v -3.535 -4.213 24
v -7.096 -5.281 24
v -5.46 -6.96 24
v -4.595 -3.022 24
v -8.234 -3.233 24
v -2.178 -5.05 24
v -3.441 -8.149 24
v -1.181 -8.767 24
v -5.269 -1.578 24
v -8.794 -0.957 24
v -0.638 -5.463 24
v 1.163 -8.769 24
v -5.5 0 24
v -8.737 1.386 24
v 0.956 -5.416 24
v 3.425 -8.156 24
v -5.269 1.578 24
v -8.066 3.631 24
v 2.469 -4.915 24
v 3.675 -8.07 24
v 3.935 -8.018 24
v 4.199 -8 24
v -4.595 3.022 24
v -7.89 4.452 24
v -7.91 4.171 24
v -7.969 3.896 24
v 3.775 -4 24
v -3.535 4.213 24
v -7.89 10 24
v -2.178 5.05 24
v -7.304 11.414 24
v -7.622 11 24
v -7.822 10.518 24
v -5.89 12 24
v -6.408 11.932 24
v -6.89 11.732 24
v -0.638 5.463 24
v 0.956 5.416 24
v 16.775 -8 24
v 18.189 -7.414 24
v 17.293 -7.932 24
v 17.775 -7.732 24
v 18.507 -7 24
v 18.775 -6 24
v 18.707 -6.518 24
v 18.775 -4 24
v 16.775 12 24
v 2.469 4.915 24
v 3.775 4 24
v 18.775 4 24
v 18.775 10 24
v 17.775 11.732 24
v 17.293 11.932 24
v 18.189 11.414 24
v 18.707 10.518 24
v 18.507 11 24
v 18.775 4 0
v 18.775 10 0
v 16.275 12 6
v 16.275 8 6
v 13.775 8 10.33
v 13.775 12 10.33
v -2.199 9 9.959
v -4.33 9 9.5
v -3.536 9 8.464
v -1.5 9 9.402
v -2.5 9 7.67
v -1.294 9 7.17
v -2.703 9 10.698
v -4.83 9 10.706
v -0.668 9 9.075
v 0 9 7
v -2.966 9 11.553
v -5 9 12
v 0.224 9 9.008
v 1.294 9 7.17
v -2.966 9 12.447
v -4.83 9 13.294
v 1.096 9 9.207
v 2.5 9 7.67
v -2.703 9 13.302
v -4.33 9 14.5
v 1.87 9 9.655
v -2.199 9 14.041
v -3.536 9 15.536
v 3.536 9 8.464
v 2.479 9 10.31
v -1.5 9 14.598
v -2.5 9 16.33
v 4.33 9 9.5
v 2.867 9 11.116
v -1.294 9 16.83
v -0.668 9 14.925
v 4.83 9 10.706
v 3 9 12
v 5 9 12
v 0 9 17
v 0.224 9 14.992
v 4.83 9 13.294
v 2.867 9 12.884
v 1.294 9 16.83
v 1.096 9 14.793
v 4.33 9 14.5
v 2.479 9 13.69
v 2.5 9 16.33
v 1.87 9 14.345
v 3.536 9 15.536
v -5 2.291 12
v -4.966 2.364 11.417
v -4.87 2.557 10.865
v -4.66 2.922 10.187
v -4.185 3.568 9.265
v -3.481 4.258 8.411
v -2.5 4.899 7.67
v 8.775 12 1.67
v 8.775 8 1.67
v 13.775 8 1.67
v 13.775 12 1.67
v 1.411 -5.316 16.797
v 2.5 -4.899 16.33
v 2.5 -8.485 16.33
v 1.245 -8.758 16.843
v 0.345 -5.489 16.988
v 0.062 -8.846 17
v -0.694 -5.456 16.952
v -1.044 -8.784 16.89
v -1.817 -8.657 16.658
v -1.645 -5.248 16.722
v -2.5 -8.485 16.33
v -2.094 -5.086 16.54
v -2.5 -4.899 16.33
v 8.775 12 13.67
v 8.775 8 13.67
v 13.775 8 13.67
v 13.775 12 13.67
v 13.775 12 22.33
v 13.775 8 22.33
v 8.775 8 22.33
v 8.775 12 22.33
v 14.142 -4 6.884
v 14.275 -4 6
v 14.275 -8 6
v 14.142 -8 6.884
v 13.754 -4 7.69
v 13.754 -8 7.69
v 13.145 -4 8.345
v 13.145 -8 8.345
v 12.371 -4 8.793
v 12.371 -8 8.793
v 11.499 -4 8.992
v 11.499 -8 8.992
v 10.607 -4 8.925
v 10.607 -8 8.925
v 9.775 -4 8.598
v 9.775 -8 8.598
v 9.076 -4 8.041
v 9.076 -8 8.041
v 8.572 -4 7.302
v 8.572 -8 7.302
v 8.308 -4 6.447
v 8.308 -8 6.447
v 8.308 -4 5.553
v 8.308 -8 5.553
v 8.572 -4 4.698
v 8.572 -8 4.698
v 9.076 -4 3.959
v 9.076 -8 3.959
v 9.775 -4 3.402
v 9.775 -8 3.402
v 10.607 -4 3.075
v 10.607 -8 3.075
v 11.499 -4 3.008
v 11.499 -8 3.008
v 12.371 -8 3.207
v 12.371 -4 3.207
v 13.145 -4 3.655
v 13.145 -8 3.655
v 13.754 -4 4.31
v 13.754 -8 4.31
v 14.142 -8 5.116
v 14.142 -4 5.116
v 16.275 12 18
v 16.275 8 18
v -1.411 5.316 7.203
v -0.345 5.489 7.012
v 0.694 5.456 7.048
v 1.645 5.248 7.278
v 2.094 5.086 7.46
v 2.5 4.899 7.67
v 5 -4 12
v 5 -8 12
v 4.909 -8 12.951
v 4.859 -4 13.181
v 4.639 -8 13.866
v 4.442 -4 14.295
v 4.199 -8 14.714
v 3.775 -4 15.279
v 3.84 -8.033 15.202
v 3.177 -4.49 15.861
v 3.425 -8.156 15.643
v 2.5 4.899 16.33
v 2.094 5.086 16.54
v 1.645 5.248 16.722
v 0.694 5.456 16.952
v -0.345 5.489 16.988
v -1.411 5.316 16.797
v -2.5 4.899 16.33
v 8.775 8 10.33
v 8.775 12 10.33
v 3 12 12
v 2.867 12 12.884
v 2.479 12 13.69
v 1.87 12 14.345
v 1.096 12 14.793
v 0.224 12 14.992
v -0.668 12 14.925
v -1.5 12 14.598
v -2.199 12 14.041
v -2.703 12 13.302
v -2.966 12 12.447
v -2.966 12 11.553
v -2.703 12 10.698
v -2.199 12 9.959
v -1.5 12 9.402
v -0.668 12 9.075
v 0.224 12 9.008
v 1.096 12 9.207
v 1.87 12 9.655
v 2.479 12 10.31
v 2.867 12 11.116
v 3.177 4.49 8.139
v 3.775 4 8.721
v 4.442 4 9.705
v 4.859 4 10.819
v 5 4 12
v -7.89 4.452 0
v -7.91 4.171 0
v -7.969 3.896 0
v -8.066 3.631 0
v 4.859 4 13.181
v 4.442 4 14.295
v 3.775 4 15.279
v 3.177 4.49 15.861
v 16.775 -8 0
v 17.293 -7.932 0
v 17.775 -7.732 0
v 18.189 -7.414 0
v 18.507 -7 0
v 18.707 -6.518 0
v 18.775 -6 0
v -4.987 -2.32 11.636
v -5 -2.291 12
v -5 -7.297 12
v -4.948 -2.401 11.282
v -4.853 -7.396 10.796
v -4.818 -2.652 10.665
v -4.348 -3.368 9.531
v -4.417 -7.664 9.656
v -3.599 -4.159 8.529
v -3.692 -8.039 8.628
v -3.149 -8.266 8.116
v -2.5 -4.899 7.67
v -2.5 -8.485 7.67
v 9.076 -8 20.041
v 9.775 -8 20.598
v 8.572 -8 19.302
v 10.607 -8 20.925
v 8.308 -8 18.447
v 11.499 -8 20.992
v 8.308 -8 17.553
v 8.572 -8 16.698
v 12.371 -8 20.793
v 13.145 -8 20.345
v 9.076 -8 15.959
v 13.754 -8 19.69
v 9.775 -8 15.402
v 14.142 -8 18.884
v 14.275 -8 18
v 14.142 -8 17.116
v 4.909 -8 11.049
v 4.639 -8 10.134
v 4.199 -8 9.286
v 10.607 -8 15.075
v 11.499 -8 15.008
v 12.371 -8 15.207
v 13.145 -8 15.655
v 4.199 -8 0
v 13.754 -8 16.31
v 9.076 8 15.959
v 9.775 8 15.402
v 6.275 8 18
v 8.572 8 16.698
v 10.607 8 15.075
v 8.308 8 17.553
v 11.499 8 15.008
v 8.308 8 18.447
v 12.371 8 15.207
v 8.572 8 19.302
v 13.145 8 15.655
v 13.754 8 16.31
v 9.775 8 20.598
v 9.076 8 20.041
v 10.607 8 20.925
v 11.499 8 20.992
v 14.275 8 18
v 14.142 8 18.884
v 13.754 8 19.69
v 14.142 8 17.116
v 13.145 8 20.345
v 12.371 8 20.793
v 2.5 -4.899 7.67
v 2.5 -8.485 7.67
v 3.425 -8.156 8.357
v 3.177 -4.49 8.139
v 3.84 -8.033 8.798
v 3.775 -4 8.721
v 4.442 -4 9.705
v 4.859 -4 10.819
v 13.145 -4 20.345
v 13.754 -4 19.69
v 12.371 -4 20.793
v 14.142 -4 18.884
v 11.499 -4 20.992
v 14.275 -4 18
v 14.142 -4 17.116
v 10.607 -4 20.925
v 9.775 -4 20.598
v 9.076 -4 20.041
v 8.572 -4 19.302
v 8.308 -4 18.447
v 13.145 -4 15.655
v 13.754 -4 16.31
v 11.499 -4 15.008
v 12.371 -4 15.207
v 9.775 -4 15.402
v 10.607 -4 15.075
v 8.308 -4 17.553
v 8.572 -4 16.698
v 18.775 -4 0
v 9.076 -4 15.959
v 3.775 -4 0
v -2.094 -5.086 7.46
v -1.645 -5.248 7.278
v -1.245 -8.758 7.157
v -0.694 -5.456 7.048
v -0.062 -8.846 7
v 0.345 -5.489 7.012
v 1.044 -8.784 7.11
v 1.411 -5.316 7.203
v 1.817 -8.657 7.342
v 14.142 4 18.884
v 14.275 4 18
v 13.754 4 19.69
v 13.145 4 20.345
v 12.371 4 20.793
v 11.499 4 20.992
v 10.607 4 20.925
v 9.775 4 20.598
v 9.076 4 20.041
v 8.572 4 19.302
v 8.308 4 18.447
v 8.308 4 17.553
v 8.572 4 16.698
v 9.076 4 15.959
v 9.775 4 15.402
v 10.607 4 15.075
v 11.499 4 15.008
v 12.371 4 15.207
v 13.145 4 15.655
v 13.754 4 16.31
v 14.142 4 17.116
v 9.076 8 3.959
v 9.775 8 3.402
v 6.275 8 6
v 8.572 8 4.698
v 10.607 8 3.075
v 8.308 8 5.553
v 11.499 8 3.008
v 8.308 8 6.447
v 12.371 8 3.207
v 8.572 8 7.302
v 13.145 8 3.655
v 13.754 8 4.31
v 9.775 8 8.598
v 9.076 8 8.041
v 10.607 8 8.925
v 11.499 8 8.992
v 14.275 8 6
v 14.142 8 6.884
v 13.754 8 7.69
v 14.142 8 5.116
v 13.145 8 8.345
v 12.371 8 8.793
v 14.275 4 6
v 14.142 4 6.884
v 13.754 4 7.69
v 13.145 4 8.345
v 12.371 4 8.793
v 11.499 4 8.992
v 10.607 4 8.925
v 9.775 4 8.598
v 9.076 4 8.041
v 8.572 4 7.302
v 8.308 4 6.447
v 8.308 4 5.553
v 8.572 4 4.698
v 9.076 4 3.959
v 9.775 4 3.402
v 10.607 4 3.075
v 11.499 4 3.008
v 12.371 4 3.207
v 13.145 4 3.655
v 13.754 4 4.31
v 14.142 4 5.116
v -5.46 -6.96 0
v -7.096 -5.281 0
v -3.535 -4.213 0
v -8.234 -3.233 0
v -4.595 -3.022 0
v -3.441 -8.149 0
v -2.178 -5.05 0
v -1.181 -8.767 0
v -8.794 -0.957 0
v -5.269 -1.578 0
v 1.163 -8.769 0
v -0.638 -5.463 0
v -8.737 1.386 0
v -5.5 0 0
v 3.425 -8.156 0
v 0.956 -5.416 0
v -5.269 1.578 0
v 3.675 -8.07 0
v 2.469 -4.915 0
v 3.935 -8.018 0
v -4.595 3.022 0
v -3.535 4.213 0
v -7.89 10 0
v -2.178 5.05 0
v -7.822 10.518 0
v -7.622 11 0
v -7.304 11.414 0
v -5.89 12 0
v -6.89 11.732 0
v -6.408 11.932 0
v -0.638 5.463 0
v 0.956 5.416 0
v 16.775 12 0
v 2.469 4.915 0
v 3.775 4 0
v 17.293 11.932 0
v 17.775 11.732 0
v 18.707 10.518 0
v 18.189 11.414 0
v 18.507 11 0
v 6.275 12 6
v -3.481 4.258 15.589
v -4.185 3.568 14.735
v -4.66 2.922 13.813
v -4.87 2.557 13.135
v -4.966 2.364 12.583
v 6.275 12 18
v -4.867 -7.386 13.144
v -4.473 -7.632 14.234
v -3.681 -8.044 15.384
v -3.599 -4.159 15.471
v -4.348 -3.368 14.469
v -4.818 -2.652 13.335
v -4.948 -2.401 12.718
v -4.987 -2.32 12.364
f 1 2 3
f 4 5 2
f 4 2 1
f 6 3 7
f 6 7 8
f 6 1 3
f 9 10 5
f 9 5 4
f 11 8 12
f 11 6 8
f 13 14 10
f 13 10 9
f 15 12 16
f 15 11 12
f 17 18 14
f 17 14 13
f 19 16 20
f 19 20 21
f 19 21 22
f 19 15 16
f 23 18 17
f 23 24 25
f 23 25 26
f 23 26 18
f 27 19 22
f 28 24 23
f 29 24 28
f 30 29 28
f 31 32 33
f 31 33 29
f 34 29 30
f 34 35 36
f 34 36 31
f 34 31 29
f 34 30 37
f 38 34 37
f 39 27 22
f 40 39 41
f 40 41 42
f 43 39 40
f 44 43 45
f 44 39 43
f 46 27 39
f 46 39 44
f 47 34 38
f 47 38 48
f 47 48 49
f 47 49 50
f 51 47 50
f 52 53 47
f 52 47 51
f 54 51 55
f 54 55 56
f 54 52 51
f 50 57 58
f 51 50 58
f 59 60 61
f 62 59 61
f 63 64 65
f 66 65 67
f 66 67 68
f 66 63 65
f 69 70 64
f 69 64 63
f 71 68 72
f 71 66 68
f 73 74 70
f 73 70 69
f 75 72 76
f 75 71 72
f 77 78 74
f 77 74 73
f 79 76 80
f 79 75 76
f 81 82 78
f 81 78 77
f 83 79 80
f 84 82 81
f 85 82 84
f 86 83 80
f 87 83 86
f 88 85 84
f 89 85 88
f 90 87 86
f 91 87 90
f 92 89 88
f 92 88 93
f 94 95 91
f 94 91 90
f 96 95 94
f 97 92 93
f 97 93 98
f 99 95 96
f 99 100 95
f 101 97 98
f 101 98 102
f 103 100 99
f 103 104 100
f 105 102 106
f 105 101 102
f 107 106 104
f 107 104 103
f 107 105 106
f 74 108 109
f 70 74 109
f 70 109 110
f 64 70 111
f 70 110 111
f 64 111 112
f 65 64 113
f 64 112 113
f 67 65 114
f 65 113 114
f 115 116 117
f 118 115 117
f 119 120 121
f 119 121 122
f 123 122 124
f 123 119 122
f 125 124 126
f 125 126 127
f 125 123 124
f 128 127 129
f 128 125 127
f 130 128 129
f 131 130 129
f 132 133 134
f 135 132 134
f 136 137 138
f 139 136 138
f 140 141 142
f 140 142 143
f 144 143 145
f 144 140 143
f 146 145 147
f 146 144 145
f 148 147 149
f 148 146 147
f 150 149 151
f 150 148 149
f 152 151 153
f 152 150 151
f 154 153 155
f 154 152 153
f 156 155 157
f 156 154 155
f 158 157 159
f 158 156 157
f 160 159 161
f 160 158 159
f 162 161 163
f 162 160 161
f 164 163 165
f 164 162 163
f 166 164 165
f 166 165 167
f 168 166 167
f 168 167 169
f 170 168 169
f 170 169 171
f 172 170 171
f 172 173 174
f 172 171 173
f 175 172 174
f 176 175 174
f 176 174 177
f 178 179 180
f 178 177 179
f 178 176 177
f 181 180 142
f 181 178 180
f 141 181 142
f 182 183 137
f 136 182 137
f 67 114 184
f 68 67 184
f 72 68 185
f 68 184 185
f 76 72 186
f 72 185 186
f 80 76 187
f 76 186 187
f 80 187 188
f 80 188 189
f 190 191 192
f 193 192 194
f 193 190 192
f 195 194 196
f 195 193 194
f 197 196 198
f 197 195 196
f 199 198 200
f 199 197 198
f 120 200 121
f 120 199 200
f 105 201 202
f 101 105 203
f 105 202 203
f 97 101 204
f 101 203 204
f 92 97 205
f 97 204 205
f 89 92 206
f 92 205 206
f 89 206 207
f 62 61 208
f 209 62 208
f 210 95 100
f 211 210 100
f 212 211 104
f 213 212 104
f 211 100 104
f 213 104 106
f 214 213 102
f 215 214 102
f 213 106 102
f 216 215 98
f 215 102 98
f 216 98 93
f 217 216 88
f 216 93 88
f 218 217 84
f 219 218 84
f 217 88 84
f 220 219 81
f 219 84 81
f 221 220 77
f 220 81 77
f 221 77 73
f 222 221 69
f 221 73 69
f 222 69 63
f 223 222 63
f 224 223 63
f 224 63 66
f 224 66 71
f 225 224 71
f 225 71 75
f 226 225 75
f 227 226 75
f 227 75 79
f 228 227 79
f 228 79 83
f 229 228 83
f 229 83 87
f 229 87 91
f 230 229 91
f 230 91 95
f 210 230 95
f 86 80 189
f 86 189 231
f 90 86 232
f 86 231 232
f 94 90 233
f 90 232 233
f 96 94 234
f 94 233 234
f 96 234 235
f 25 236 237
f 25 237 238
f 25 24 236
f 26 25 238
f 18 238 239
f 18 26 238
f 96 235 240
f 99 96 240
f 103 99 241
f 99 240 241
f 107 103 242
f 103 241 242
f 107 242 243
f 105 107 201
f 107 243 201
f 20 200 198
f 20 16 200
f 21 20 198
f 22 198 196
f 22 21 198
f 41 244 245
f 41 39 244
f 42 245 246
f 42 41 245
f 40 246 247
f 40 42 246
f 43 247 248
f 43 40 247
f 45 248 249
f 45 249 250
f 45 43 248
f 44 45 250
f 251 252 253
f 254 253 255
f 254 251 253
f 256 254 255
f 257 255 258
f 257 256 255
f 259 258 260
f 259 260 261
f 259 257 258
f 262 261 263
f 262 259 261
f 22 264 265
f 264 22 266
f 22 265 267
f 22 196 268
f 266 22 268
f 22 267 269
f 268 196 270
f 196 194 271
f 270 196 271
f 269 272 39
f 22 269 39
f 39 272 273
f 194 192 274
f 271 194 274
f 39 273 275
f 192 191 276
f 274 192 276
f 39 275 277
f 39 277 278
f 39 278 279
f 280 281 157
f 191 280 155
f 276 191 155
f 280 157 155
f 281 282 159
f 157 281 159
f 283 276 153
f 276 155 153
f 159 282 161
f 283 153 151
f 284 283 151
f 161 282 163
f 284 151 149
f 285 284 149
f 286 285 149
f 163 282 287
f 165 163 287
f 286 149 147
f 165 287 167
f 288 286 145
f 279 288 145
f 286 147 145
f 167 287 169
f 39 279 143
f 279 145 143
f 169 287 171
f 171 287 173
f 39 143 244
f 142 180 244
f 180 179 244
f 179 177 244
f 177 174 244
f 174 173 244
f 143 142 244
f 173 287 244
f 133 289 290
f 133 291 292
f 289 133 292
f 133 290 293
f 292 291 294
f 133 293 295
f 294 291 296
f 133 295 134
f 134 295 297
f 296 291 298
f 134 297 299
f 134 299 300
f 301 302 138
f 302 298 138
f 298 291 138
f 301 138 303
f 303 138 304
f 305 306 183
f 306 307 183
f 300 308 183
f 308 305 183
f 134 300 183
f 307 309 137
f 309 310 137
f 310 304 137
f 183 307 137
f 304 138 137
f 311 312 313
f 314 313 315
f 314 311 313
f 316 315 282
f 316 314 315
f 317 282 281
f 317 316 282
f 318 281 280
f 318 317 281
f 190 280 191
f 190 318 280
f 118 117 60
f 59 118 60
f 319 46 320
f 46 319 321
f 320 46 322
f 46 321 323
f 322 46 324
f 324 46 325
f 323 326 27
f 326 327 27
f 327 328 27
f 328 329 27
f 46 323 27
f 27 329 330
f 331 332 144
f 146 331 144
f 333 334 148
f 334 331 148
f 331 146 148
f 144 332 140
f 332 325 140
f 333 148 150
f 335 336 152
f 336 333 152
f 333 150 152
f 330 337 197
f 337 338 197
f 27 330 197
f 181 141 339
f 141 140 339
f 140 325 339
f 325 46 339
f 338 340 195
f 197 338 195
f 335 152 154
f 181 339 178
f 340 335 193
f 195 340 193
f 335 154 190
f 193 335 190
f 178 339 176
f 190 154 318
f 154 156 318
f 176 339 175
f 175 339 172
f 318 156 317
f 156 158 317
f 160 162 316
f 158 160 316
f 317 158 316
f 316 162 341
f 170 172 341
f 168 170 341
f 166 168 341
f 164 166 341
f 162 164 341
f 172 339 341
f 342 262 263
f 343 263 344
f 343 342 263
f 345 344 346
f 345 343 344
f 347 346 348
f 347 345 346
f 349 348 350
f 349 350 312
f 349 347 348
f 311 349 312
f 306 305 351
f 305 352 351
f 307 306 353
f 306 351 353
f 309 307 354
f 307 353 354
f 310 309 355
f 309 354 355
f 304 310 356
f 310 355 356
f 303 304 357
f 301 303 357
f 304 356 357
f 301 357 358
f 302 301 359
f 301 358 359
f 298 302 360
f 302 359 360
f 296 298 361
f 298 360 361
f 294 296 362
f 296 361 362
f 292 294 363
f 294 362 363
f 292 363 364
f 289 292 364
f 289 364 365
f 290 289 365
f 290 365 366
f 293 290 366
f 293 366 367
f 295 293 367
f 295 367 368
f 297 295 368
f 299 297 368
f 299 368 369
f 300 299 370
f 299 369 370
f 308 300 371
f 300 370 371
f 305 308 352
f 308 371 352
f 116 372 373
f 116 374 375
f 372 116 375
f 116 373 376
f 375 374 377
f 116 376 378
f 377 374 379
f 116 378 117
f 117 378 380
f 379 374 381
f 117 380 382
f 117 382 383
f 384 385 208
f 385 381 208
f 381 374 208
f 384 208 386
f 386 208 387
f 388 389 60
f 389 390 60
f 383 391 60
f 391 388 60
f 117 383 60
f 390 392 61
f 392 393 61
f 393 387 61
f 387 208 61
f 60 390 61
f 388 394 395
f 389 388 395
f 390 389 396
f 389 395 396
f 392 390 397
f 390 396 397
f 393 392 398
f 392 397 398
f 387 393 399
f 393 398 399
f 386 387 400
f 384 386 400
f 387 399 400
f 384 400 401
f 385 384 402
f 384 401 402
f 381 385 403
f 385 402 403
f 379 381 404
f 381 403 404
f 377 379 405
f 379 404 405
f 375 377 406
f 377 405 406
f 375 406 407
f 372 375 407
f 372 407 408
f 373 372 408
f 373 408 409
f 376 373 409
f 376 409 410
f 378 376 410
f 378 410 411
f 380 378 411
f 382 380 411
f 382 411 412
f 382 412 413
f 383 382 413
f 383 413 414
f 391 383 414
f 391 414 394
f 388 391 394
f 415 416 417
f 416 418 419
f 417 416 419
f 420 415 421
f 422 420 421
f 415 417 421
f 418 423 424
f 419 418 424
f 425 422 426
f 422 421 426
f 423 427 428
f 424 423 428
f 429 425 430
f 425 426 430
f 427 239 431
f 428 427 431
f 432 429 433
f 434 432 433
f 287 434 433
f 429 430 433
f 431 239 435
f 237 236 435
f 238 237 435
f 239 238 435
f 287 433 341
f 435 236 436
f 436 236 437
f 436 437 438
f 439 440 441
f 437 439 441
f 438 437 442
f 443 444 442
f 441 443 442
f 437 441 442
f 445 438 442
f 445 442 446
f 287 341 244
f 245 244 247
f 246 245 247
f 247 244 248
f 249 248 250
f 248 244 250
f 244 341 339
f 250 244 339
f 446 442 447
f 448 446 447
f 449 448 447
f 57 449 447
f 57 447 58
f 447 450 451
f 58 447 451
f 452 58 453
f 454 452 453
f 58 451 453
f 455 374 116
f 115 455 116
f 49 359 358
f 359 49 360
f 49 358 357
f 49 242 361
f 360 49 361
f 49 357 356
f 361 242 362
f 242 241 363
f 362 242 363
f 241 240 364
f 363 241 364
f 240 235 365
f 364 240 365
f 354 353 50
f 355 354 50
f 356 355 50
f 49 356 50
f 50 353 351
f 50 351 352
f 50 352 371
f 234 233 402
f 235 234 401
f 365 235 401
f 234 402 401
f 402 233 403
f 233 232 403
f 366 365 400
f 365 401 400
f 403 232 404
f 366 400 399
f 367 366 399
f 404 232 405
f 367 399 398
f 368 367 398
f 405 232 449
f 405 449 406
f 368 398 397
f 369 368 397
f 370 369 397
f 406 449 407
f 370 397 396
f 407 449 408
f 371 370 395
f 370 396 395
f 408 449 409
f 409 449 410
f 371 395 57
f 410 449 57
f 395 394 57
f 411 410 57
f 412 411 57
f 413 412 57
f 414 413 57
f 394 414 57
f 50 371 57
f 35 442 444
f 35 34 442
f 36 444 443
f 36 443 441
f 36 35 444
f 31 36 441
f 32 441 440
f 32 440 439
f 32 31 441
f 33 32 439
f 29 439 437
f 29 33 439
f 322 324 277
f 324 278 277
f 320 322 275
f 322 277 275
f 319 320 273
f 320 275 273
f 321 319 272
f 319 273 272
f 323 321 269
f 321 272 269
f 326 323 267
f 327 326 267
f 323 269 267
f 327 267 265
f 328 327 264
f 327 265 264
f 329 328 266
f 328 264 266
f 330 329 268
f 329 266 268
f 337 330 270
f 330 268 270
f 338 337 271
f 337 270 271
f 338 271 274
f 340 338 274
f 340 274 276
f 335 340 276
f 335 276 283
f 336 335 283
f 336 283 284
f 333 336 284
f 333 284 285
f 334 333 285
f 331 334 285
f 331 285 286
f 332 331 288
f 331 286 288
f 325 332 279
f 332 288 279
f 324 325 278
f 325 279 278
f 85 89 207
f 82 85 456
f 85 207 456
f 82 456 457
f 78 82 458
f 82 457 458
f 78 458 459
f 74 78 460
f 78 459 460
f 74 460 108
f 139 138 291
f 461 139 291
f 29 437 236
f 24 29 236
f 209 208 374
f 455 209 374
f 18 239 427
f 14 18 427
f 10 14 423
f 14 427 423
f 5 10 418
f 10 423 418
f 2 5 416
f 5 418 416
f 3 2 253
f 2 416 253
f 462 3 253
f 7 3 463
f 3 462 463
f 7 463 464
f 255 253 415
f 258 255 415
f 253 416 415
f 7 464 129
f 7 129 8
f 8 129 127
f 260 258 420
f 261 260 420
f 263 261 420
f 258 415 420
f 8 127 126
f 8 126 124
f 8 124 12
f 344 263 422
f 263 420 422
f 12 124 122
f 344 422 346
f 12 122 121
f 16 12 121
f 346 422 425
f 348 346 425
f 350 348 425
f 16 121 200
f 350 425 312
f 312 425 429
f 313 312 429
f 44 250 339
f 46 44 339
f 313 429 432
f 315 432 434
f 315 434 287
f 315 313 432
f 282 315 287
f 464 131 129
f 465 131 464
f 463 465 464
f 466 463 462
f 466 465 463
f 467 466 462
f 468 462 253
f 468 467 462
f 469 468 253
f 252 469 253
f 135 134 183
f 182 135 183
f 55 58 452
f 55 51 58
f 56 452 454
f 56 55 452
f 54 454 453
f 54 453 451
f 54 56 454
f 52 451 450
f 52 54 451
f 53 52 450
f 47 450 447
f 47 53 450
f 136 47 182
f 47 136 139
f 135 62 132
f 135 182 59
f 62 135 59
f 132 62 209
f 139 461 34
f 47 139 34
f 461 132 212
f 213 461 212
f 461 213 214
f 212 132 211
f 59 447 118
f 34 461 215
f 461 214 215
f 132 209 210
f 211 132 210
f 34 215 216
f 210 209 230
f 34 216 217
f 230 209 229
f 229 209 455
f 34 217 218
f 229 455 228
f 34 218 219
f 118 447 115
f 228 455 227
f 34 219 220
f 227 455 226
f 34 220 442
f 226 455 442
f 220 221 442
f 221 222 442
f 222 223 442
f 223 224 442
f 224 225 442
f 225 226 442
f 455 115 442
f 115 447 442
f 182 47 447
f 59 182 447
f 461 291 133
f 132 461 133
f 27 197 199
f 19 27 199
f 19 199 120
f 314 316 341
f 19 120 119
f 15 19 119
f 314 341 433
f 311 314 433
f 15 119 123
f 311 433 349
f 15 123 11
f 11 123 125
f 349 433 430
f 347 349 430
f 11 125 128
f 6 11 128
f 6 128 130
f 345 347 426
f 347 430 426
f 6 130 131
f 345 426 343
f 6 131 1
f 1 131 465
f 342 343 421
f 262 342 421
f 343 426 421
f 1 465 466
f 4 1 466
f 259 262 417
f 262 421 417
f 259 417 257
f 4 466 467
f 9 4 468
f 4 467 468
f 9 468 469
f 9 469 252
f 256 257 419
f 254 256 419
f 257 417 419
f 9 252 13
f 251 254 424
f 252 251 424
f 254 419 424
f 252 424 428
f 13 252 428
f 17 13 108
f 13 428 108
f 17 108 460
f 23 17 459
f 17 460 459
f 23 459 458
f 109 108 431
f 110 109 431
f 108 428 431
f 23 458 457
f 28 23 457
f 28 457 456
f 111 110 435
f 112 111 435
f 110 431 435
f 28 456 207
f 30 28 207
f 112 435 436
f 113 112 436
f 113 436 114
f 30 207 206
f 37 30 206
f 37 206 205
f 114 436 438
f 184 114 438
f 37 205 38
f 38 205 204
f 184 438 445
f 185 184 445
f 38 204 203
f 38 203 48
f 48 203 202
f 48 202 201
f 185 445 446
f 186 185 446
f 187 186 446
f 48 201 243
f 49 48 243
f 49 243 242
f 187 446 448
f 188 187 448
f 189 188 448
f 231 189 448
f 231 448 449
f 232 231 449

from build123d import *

# Parameters (mm, degrees)
F1_DEPTH = 24
F2_R     = 3
F3_DEPTH = 25
F4_START = -8
F4_DEPTH = 17
F5_DEPTH = 25
F6_DEPTH = 9
F7_DEPTH = 25
F8_R     = 2


with BuildPart() as f1:
    # F0 (on Top) → F1 (new body)
    with BuildSketch(Plane.XY):
        with BuildLine():
            ThreePointArc((3.7749172176, -4), (-5.5, 0), (3.7749172176, 4))
            Line((3.7749172176, 4), (18.7749172176, 4))
            Line((18.7749172176, 4), (18.7749172176, 8))
            Line((18.7749172176, 8), (18.7749172176, 12))
            Line((18.7749172176, 12), (3.7749172176, 12))
            Line((3.7749172176, 12), (-7.889866919, 12))
            Line((-7.889866919, 12), (-7.889866919, 4))
            ThreePointArc((-7.889866919, 4), (-6.3429648242, -6.1657762884), (3.7749172176, -8))
            Line((3.7749172176, -8), (18.7749172176, -8))
            Line((18.7749172176, -8), (18.7749172176, -4))
            Line((18.7749172176, -4), (3.7749172176, -4))
        make_face()
    extrude(amount=F1_DEPTH)

    # F2 (on Front) → F3 (cut, symmetric)
    with BuildSketch(Plane.XZ):
        with Locations((11.2749172176, 6)):
            Circle(F2_R)
        with Locations((11.2749172176, 18)):
            Circle(F2_R)
    extrude(amount=F3_DEPTH, both=True, mode=Mode.SUBTRACT)

    # F2 (on Front) → F4 (cut)
    with BuildSketch(Plane.XZ.offset(F4_START)):
        Polygon((13.7749172176, 13.6698729811), (16.2749172176, 18), (13.7749172176, 22.3301270189), (8.7749172176, 22.3301270189), (6.2749172176, 18), (8.7749172176, 13.6698729811), align=None)
        with Locations((11.2749172176, 18)):
            Circle(F2_R, mode=Mode.SUBTRACT)
        Polygon((8.7749172176, 10.3301270189), (6.2749172176, 6), (8.7749172176, 1.6698729811), (13.7749172176, 1.6698729811), (16.2749172176, 6), (13.7749172176, 10.3301270189), align=None)
        with Locations((11.2749172176, 6)):
            Circle(F2_R, mode=Mode.SUBTRACT)
    extrude(amount=-F4_DEPTH, mode=Mode.SUBTRACT)

    # F2 (on Front) → F5 (cut)
    with BuildSketch(Plane.XZ):
        with Locations((0, 12)):
            Circle(F2_R)
    extrude(amount=-F5_DEPTH, mode=Mode.SUBTRACT)

    # F2 (on Front) → F6 (cut)
    with BuildSketch(Plane.XZ):
        Polygon((2.5, 7.6698729811), (5, 12), (2.5, 16.3301270189), (-2.5, 16.3301270189), (-5, 12), (-2.5, 7.6698729811), align=None)
        with Locations((0, 12)):
            Circle(F2_R, mode=Mode.SUBTRACT)
        with Locations((0, 12)):
            Circle(F2_R)
        with BuildLine():
            ThreePointArc((2.5, 7.6698729811), (4.3301270189, 9.5), (5, 12))
            Line((5, 12), (2.5, 7.6698729811))
        make_face()
        with BuildLine():
            Line((2.5, 16.3301270189), (5, 12))
            ThreePointArc((5, 12), (4.3301270189, 14.5), (2.5, 16.3301270189))
        make_face()
        with BuildLine():
            Line((-2.5, 16.3301270189), (2.5, 16.3301270189))
            ThreePointArc((2.5, 16.3301270189), (0, 17), (-2.5, 16.3301270189))
        make_face()
        with BuildLine():
            Line((-5, 12), (-2.5, 16.3301270189))
            ThreePointArc((-2.5, 16.3301270189), (-4.3301270189, 14.5), (-5, 12))
        make_face()
        with BuildLine():
            ThreePointArc((-5, 12), (-4.3301270189, 9.5), (-2.5, 7.6698729811))
            Line((-2.5, 7.6698729811), (-5, 12))
        make_face()
        with BuildLine():
            ThreePointArc((-2.5, 7.6698729811), (0, 7), (2.5, 7.6698729811))
            Line((2.5, 7.6698729811), (-2.5, 7.6698729811))
        make_face()
    extrude(amount=-F6_DEPTH, mode=Mode.SUBTRACT)

    # F2 (on Front) → F7 (cut)
    with BuildSketch(Plane.XZ):
        with BuildLine():
            Line((-2.5, 16.3301270189), (2.5, 16.3301270189))
            ThreePointArc((2.5, 16.3301270189), (0, 17), (-2.5, 16.3301270189))
        make_face()
        Polygon((2.5, 7.6698729811), (5, 12), (2.5, 16.3301270189), (-2.5, 16.3301270189), (-5, 12), (-2.5, 7.6698729811), align=None)
        with Locations((0, 12)):
            Circle(F2_R, mode=Mode.SUBTRACT)
        with BuildLine():
            Line((2.5, 16.3301270189), (5, 12))
            ThreePointArc((5, 12), (4.3301270189, 14.5), (2.5, 16.3301270189))
        make_face()
        with BuildLine():
            ThreePointArc((2.5, 7.6698729811), (4.3301270189, 9.5), (5, 12))
            Line((5, 12), (2.5, 7.6698729811))
        make_face()
        with BuildLine():
            ThreePointArc((-2.5, 7.6698729811), (0, 7), (2.5, 7.6698729811))
            Line((2.5, 7.6698729811), (-2.5, 7.6698729811))
        make_face()
        with BuildLine():
            ThreePointArc((-5, 12), (-4.3301270189, 9.5), (-2.5, 7.6698729811))
            Line((-2.5, 7.6698729811), (-5, 12))
        make_face()
        with BuildLine():
            Line((-5, 12), (-2.5, 16.3301270189))
            ThreePointArc((-2.5, 16.3301270189), (-4.3301270189, 14.5), (-5, 12))
        make_face()
        with Locations((0, 12)):
            Circle(F2_R)
    extrude(amount=F7_DEPTH, mode=Mode.SUBTRACT)

    # F8
    f8_edges = [f1.edges().sort_by_distance(p)[0] for p in [
        (-7.889867, 12, 12),
        (-7.889867, 4, 12),
        (18.774917, -8, 12),
        (18.774917, 12, 12),
        (3.774917, -8, 19.63936),
        (3.774917, -8, 4.36064),
    ]]
    fillet(f8_edges, radius=F8_R)


solid = f1.part
